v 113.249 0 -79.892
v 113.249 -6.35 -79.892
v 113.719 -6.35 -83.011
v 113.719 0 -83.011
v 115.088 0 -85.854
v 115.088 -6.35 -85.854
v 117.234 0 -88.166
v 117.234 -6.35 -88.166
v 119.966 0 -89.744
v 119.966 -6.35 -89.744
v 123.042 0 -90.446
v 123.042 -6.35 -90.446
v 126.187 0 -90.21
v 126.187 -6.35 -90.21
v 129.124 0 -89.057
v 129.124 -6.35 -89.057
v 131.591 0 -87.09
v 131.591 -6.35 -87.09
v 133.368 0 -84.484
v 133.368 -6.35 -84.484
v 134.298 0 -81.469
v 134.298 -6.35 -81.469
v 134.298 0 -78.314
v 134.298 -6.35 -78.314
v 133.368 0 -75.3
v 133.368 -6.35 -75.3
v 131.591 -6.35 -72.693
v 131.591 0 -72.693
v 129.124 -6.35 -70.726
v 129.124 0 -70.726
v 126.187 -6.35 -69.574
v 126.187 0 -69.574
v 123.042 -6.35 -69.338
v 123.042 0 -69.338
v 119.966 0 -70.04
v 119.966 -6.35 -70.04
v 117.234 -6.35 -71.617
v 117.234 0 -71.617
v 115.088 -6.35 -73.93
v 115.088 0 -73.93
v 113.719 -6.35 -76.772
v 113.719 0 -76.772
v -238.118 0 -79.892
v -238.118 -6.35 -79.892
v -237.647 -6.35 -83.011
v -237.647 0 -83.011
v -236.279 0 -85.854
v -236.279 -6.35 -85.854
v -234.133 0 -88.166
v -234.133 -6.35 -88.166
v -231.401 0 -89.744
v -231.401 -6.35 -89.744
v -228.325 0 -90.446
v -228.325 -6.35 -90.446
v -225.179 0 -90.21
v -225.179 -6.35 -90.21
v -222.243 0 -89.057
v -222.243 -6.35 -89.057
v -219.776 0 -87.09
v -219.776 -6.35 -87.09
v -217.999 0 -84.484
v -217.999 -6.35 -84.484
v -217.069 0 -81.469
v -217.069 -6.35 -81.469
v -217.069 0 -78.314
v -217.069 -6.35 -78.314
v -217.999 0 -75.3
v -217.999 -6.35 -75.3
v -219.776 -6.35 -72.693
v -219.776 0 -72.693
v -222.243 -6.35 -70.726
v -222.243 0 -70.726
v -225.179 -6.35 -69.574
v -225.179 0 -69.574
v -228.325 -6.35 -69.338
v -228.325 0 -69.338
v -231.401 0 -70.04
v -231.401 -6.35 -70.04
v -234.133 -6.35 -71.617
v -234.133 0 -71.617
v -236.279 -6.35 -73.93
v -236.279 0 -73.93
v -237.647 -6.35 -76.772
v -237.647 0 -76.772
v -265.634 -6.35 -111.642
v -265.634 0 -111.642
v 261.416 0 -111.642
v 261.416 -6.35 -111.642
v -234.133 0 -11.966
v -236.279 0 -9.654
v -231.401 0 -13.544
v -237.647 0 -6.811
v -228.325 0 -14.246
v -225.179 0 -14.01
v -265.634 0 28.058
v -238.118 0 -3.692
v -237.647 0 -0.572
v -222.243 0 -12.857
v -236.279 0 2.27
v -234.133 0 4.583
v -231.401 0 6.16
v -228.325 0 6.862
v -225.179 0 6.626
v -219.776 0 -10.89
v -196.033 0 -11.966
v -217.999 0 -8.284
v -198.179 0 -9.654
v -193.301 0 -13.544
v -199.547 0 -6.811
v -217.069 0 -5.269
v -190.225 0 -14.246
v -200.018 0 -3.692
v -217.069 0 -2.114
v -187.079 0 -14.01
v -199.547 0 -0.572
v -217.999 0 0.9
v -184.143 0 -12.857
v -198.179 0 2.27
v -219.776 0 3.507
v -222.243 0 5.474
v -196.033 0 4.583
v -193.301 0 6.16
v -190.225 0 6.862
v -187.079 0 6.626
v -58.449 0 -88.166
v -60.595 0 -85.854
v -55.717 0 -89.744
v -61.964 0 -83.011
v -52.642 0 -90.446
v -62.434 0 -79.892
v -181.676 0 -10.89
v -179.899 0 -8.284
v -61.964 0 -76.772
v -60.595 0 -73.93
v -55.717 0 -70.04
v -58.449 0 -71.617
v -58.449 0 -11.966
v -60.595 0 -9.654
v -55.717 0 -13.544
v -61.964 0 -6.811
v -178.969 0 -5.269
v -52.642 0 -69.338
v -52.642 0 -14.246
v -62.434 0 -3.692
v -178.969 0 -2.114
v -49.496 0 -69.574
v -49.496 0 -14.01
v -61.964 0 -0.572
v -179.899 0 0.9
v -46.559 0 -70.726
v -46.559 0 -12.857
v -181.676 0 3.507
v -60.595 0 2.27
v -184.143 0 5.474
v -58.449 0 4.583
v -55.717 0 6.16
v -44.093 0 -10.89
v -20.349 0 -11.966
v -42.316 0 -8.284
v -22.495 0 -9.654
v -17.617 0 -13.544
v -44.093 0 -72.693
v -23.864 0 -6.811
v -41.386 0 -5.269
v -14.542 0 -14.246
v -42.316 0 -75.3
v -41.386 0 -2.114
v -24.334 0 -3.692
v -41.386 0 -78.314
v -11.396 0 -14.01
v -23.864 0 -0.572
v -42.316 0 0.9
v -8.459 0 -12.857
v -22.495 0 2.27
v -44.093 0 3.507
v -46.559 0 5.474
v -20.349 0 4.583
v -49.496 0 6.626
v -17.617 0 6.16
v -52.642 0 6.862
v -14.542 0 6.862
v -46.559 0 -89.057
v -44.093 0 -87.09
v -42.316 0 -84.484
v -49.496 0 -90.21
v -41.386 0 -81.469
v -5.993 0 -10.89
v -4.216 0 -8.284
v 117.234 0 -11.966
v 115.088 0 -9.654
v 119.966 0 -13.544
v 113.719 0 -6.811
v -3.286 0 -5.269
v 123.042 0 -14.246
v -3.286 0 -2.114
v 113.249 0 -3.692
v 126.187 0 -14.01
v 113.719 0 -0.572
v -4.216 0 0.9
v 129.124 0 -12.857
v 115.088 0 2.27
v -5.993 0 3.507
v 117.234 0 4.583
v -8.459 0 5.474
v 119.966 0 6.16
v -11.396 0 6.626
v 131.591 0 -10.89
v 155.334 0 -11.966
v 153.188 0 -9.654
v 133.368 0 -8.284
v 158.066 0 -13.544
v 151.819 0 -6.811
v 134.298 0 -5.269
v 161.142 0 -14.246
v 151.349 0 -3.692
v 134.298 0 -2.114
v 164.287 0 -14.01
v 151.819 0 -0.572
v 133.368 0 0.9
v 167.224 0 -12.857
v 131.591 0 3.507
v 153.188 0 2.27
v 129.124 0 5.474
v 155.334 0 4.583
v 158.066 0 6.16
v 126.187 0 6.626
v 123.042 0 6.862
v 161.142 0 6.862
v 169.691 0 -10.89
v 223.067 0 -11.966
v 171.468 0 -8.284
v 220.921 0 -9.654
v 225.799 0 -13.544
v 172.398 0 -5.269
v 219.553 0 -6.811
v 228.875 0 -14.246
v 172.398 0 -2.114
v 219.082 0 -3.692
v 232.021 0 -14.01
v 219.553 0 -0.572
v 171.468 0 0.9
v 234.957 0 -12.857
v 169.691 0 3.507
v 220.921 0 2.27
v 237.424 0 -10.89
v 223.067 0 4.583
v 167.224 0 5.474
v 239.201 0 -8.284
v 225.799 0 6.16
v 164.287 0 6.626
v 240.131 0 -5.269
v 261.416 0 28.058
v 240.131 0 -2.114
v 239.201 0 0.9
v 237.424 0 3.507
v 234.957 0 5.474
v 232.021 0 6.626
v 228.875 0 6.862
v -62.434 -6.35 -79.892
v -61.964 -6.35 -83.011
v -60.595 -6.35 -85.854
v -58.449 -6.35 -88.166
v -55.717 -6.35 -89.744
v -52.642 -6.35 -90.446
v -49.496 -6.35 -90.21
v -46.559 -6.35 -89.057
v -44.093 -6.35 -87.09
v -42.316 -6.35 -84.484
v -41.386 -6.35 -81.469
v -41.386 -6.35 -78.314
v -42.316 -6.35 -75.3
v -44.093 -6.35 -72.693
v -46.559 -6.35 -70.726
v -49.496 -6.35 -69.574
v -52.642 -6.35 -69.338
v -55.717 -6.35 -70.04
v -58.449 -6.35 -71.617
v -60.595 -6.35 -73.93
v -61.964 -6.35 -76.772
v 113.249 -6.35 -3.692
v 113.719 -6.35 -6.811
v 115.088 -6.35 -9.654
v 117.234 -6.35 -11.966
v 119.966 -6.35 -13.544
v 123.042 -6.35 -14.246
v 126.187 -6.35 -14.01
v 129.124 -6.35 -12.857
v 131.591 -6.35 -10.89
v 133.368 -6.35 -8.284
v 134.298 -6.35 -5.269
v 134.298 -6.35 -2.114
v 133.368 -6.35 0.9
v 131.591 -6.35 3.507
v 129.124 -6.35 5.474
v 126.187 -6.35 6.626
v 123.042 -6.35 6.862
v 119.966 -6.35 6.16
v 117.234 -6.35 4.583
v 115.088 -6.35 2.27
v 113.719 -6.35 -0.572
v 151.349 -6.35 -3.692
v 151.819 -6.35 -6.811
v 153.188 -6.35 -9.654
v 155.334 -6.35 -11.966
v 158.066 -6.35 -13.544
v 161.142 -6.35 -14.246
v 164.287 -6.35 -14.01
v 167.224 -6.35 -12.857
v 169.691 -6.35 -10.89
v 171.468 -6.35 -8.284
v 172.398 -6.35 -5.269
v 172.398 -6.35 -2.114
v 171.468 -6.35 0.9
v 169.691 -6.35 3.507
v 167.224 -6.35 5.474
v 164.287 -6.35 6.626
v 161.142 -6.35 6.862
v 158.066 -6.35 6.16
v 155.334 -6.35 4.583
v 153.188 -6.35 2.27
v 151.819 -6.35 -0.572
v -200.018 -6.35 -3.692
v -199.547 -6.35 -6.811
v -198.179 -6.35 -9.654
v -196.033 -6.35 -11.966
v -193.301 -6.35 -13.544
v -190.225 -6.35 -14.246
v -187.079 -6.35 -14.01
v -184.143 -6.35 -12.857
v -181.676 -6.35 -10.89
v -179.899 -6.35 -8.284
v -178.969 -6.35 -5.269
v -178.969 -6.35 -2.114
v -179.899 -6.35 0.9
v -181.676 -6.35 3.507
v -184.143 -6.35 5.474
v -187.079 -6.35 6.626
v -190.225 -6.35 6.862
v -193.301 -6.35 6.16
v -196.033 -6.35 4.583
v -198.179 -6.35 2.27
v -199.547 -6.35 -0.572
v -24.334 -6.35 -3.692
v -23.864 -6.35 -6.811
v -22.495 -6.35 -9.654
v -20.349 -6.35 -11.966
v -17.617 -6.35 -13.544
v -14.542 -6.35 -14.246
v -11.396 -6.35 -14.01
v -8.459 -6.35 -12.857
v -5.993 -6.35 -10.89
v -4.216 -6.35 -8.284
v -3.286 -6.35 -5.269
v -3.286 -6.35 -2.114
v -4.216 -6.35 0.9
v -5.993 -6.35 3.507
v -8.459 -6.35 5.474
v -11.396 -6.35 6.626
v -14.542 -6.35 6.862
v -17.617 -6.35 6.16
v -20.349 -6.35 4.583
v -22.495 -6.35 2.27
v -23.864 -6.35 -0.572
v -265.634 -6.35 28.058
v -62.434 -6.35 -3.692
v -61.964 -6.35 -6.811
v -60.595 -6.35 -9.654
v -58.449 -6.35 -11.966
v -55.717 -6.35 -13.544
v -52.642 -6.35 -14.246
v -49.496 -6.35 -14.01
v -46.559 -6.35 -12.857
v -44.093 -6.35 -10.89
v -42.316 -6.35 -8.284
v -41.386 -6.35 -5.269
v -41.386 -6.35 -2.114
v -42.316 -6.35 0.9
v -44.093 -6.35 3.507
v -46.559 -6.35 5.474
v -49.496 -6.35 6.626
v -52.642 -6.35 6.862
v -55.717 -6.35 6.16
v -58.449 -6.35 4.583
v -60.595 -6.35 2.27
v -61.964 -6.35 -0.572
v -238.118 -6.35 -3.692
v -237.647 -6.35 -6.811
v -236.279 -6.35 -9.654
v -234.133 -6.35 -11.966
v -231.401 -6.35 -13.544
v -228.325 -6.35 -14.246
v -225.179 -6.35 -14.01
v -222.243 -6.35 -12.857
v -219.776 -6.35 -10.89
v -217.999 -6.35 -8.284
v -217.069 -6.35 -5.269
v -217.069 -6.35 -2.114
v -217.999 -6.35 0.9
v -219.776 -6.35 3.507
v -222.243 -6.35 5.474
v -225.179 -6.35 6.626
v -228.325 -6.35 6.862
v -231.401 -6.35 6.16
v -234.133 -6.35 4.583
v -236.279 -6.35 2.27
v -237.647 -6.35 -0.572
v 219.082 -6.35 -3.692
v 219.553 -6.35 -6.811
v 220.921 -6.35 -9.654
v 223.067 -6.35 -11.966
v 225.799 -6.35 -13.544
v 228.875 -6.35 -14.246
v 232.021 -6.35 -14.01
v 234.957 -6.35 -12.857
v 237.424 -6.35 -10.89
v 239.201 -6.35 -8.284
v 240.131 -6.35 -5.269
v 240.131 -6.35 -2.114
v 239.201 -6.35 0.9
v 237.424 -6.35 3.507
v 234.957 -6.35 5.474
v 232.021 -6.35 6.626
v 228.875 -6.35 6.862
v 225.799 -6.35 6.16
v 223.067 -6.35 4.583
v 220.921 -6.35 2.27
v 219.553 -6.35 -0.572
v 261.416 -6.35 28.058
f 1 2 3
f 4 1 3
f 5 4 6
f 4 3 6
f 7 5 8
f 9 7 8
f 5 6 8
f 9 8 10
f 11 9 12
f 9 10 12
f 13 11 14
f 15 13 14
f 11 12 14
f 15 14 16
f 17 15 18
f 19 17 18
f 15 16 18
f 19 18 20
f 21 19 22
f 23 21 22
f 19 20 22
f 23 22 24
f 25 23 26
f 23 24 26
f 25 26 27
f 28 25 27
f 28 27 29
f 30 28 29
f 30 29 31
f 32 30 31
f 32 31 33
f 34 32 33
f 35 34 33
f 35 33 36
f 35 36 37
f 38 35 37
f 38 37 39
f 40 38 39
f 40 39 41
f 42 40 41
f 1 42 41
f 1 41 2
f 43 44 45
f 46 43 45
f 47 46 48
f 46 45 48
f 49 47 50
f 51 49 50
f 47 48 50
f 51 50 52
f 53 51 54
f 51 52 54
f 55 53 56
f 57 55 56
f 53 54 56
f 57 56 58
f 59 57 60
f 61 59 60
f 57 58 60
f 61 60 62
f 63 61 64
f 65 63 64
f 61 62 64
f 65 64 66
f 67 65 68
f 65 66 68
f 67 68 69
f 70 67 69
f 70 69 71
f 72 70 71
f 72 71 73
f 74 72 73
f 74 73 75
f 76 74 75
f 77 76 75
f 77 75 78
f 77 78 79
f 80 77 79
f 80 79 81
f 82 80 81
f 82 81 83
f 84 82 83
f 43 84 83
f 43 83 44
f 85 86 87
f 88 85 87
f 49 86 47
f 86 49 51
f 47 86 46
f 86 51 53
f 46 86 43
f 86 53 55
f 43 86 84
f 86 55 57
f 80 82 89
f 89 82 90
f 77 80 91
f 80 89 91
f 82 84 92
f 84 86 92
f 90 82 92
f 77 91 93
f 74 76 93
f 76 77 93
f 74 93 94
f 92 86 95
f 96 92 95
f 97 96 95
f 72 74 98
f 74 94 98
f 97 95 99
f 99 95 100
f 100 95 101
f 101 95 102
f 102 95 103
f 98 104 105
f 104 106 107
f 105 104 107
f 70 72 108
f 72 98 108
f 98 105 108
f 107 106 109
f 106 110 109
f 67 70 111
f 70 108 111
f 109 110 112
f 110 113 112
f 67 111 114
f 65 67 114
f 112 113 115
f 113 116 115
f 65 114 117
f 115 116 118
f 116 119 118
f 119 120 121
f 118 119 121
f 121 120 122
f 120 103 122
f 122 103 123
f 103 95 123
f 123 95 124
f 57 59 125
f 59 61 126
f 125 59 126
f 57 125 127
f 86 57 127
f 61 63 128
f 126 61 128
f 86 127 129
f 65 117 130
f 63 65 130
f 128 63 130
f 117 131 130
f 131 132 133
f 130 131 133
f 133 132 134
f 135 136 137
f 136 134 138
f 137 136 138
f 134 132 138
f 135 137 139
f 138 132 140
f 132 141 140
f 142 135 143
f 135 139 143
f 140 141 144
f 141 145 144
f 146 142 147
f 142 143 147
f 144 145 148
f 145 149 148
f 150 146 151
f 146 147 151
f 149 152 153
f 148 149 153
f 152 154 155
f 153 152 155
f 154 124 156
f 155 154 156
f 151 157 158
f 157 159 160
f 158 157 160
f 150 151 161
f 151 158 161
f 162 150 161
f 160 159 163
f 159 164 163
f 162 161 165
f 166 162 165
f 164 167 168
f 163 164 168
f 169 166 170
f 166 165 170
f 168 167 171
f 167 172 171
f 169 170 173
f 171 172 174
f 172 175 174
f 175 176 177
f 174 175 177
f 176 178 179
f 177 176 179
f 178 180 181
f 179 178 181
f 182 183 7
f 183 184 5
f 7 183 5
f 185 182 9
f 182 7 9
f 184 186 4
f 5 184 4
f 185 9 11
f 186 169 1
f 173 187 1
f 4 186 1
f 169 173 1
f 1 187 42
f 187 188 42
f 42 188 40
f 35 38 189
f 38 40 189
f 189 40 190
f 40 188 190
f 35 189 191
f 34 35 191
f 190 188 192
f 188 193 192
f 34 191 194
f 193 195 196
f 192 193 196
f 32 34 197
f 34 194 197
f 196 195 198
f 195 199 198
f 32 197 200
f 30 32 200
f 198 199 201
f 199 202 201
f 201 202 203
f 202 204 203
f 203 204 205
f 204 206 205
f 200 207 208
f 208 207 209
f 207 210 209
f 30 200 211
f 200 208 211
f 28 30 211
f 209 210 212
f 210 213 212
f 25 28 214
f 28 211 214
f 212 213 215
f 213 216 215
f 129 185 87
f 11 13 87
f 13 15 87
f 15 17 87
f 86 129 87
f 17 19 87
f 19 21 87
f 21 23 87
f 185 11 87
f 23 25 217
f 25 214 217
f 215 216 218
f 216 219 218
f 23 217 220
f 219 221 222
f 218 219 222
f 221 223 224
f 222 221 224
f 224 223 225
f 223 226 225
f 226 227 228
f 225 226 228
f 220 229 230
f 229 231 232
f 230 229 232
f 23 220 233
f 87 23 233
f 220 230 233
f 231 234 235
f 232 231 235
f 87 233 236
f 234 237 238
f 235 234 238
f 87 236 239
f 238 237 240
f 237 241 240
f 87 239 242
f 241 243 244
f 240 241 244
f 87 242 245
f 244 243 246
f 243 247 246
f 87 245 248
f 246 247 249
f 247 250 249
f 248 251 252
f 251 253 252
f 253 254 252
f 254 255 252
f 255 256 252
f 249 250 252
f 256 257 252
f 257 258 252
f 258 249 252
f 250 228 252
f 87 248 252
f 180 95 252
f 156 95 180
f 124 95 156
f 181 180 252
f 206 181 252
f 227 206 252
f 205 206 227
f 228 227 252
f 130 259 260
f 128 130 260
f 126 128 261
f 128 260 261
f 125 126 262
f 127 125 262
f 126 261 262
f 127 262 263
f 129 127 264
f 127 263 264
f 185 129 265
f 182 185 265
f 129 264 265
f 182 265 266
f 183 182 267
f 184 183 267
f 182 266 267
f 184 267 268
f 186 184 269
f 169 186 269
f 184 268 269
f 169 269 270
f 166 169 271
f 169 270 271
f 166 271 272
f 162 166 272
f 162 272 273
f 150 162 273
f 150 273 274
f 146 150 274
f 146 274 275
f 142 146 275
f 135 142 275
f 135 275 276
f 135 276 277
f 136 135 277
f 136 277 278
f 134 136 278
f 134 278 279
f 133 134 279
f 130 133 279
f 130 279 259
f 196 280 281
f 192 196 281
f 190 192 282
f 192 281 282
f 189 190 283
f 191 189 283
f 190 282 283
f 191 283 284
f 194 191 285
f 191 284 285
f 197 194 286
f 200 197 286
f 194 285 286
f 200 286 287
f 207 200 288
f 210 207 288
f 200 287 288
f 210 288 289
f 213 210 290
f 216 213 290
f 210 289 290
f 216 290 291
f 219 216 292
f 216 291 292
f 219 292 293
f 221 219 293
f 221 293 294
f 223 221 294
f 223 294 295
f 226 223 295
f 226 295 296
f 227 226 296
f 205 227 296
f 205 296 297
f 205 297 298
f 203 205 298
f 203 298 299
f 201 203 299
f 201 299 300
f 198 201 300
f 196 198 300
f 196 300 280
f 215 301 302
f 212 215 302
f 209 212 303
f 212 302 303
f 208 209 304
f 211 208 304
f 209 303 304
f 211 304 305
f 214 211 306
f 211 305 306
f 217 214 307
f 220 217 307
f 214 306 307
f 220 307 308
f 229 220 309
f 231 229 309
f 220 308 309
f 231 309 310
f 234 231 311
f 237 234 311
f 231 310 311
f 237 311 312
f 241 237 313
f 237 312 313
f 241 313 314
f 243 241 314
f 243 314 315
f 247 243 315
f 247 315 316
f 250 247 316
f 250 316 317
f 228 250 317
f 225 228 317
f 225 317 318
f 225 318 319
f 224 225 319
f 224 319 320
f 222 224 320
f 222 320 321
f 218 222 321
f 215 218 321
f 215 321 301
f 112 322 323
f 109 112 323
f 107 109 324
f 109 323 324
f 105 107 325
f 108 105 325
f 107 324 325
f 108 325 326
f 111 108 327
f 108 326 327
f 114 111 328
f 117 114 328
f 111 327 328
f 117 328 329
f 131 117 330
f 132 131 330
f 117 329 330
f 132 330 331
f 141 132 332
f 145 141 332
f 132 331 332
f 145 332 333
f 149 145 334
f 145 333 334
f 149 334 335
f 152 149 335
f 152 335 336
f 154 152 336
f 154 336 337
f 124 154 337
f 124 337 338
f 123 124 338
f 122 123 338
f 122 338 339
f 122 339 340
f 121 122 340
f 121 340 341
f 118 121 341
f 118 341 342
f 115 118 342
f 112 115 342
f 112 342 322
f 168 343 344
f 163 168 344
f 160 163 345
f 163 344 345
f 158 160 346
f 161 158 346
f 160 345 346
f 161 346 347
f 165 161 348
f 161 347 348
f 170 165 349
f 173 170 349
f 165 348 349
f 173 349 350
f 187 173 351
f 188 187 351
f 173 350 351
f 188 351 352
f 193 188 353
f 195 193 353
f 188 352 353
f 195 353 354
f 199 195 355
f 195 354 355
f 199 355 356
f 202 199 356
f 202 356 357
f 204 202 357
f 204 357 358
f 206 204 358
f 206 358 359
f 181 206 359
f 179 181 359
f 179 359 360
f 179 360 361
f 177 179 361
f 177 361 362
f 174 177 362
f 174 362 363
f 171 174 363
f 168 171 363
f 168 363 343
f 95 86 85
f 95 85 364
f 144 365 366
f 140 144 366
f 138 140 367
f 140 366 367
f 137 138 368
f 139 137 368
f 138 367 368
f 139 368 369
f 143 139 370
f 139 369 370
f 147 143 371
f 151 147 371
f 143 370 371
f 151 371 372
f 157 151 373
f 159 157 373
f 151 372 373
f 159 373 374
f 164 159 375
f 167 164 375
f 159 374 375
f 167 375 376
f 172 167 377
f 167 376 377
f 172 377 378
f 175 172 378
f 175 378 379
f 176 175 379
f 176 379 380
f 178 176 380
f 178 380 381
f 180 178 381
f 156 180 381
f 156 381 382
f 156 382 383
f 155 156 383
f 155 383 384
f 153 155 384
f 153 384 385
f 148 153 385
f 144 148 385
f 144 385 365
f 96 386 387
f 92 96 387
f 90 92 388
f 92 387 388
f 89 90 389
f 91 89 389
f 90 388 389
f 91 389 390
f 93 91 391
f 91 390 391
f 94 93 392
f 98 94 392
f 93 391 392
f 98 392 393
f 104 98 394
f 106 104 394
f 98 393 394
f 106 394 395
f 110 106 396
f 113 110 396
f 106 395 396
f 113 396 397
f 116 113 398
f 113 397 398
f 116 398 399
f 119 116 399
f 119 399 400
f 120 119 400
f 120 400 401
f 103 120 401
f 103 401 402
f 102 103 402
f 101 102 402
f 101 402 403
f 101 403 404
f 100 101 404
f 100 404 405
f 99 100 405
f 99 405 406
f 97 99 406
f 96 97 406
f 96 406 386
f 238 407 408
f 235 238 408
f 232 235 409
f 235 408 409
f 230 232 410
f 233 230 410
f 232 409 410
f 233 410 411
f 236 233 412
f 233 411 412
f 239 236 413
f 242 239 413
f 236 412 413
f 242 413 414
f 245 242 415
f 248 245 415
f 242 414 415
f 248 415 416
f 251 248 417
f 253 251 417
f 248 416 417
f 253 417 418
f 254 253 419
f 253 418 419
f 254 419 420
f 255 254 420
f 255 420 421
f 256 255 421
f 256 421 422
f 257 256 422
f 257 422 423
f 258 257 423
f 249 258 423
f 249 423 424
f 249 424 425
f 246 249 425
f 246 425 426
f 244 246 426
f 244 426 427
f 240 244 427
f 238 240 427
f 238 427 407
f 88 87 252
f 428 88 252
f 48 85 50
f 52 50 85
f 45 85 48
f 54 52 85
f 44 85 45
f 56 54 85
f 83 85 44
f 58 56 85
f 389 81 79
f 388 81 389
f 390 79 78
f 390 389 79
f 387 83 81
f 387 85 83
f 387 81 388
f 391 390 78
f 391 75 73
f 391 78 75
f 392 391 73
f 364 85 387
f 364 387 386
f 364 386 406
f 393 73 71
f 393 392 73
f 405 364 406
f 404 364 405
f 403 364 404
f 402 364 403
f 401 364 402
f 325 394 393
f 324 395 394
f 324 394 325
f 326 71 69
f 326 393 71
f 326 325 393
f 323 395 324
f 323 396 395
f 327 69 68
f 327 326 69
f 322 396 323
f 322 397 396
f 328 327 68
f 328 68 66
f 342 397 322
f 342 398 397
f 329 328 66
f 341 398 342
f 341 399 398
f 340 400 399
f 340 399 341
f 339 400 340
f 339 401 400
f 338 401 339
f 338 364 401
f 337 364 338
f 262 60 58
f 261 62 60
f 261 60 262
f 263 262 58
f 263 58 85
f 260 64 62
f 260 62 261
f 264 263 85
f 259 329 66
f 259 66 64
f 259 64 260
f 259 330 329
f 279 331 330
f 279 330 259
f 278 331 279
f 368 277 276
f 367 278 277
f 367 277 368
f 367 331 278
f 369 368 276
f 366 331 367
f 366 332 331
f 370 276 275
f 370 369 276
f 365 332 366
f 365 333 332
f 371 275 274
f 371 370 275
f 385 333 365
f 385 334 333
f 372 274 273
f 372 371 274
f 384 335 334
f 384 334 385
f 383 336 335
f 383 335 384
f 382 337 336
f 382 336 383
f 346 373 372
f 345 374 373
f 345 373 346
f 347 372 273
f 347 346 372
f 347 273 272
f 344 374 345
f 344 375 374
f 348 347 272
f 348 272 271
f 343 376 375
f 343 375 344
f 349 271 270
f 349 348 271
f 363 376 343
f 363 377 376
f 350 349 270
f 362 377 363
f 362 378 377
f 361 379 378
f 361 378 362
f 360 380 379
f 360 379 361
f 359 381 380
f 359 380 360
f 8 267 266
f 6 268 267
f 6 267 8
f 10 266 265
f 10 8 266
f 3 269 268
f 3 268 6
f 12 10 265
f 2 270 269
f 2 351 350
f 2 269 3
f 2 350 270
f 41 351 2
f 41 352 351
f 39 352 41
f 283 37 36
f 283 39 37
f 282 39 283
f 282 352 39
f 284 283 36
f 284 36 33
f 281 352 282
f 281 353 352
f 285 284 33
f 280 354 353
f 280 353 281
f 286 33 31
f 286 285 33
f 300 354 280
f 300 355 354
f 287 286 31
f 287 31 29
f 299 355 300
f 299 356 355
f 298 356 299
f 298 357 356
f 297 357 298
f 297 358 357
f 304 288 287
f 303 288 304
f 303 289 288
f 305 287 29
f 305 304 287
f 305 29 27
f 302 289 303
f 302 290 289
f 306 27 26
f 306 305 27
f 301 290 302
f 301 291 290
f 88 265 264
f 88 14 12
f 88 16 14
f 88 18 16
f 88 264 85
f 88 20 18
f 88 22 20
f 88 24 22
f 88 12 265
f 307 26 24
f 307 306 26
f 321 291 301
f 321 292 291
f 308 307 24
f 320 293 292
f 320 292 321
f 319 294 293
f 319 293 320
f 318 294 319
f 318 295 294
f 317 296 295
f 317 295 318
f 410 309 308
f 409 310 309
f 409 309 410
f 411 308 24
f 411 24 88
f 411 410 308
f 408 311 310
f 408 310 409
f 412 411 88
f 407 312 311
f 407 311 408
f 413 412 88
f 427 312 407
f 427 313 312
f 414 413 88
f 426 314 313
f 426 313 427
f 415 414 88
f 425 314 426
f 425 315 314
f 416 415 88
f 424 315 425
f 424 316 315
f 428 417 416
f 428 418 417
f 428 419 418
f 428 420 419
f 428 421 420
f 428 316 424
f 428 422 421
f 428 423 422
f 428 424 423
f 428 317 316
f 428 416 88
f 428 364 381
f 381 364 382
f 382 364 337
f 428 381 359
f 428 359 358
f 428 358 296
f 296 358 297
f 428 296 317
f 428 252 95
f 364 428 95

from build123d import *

# Parameters (mm, degrees)
F0_W     = 177.8
F0_H     = 139.7
F0_W_2   = 171.45
F2_DEPTH = 6.35
F3_D     = 21.1666666667
F3_DEPTH = 12.7
F3_TIP   = 6.359108218


with BuildPart() as f2:
    # F0 (on Front) → F2 (new body)
    with BuildSketch(Plane.XZ):
        with Locations((-176.7342258394, -41.7917792348)):
            Rectangle(F0_W, F0_H)
        with Locations((1.0657741606, -41.7917792348)):
            Rectangle(F0_W, F0_H)
        with Locations((175.6907741606, -41.7917792348)):
            Rectangle(F0_W_2, F0_H)
    extrude(amount=F2_DEPTH)

    # F3
    with Locations(Plane(origin=(0, 0, 0), x_dir=(1, 0, 0), z_dir=(0, 1, 0))):
        with Locations((-227.5342258394, 3.6917792348), (-189.4342258394, 3.6917792348), (-227.5342258394, 79.8917792348), (-51.850892506, 3.6917792348), (-13.750892506, 3.6917792348), (-51.850892506, 79.8917792348), (123.8324408273, 3.6917792348), (161.9324408273, 3.6917792348), (123.8324408273, 79.8917792348), (229.6657741606, 3.6917792348)):
            Hole(F3_D / 2, depth=F3_DEPTH)
            with Locations((0, 0, -(F3_DEPTH + F3_TIP / 2))):  # 118° drill point
                Cone(0, F3_D / 2, F3_TIP, mode=Mode.SUBTRACT)


solid = f2.part
